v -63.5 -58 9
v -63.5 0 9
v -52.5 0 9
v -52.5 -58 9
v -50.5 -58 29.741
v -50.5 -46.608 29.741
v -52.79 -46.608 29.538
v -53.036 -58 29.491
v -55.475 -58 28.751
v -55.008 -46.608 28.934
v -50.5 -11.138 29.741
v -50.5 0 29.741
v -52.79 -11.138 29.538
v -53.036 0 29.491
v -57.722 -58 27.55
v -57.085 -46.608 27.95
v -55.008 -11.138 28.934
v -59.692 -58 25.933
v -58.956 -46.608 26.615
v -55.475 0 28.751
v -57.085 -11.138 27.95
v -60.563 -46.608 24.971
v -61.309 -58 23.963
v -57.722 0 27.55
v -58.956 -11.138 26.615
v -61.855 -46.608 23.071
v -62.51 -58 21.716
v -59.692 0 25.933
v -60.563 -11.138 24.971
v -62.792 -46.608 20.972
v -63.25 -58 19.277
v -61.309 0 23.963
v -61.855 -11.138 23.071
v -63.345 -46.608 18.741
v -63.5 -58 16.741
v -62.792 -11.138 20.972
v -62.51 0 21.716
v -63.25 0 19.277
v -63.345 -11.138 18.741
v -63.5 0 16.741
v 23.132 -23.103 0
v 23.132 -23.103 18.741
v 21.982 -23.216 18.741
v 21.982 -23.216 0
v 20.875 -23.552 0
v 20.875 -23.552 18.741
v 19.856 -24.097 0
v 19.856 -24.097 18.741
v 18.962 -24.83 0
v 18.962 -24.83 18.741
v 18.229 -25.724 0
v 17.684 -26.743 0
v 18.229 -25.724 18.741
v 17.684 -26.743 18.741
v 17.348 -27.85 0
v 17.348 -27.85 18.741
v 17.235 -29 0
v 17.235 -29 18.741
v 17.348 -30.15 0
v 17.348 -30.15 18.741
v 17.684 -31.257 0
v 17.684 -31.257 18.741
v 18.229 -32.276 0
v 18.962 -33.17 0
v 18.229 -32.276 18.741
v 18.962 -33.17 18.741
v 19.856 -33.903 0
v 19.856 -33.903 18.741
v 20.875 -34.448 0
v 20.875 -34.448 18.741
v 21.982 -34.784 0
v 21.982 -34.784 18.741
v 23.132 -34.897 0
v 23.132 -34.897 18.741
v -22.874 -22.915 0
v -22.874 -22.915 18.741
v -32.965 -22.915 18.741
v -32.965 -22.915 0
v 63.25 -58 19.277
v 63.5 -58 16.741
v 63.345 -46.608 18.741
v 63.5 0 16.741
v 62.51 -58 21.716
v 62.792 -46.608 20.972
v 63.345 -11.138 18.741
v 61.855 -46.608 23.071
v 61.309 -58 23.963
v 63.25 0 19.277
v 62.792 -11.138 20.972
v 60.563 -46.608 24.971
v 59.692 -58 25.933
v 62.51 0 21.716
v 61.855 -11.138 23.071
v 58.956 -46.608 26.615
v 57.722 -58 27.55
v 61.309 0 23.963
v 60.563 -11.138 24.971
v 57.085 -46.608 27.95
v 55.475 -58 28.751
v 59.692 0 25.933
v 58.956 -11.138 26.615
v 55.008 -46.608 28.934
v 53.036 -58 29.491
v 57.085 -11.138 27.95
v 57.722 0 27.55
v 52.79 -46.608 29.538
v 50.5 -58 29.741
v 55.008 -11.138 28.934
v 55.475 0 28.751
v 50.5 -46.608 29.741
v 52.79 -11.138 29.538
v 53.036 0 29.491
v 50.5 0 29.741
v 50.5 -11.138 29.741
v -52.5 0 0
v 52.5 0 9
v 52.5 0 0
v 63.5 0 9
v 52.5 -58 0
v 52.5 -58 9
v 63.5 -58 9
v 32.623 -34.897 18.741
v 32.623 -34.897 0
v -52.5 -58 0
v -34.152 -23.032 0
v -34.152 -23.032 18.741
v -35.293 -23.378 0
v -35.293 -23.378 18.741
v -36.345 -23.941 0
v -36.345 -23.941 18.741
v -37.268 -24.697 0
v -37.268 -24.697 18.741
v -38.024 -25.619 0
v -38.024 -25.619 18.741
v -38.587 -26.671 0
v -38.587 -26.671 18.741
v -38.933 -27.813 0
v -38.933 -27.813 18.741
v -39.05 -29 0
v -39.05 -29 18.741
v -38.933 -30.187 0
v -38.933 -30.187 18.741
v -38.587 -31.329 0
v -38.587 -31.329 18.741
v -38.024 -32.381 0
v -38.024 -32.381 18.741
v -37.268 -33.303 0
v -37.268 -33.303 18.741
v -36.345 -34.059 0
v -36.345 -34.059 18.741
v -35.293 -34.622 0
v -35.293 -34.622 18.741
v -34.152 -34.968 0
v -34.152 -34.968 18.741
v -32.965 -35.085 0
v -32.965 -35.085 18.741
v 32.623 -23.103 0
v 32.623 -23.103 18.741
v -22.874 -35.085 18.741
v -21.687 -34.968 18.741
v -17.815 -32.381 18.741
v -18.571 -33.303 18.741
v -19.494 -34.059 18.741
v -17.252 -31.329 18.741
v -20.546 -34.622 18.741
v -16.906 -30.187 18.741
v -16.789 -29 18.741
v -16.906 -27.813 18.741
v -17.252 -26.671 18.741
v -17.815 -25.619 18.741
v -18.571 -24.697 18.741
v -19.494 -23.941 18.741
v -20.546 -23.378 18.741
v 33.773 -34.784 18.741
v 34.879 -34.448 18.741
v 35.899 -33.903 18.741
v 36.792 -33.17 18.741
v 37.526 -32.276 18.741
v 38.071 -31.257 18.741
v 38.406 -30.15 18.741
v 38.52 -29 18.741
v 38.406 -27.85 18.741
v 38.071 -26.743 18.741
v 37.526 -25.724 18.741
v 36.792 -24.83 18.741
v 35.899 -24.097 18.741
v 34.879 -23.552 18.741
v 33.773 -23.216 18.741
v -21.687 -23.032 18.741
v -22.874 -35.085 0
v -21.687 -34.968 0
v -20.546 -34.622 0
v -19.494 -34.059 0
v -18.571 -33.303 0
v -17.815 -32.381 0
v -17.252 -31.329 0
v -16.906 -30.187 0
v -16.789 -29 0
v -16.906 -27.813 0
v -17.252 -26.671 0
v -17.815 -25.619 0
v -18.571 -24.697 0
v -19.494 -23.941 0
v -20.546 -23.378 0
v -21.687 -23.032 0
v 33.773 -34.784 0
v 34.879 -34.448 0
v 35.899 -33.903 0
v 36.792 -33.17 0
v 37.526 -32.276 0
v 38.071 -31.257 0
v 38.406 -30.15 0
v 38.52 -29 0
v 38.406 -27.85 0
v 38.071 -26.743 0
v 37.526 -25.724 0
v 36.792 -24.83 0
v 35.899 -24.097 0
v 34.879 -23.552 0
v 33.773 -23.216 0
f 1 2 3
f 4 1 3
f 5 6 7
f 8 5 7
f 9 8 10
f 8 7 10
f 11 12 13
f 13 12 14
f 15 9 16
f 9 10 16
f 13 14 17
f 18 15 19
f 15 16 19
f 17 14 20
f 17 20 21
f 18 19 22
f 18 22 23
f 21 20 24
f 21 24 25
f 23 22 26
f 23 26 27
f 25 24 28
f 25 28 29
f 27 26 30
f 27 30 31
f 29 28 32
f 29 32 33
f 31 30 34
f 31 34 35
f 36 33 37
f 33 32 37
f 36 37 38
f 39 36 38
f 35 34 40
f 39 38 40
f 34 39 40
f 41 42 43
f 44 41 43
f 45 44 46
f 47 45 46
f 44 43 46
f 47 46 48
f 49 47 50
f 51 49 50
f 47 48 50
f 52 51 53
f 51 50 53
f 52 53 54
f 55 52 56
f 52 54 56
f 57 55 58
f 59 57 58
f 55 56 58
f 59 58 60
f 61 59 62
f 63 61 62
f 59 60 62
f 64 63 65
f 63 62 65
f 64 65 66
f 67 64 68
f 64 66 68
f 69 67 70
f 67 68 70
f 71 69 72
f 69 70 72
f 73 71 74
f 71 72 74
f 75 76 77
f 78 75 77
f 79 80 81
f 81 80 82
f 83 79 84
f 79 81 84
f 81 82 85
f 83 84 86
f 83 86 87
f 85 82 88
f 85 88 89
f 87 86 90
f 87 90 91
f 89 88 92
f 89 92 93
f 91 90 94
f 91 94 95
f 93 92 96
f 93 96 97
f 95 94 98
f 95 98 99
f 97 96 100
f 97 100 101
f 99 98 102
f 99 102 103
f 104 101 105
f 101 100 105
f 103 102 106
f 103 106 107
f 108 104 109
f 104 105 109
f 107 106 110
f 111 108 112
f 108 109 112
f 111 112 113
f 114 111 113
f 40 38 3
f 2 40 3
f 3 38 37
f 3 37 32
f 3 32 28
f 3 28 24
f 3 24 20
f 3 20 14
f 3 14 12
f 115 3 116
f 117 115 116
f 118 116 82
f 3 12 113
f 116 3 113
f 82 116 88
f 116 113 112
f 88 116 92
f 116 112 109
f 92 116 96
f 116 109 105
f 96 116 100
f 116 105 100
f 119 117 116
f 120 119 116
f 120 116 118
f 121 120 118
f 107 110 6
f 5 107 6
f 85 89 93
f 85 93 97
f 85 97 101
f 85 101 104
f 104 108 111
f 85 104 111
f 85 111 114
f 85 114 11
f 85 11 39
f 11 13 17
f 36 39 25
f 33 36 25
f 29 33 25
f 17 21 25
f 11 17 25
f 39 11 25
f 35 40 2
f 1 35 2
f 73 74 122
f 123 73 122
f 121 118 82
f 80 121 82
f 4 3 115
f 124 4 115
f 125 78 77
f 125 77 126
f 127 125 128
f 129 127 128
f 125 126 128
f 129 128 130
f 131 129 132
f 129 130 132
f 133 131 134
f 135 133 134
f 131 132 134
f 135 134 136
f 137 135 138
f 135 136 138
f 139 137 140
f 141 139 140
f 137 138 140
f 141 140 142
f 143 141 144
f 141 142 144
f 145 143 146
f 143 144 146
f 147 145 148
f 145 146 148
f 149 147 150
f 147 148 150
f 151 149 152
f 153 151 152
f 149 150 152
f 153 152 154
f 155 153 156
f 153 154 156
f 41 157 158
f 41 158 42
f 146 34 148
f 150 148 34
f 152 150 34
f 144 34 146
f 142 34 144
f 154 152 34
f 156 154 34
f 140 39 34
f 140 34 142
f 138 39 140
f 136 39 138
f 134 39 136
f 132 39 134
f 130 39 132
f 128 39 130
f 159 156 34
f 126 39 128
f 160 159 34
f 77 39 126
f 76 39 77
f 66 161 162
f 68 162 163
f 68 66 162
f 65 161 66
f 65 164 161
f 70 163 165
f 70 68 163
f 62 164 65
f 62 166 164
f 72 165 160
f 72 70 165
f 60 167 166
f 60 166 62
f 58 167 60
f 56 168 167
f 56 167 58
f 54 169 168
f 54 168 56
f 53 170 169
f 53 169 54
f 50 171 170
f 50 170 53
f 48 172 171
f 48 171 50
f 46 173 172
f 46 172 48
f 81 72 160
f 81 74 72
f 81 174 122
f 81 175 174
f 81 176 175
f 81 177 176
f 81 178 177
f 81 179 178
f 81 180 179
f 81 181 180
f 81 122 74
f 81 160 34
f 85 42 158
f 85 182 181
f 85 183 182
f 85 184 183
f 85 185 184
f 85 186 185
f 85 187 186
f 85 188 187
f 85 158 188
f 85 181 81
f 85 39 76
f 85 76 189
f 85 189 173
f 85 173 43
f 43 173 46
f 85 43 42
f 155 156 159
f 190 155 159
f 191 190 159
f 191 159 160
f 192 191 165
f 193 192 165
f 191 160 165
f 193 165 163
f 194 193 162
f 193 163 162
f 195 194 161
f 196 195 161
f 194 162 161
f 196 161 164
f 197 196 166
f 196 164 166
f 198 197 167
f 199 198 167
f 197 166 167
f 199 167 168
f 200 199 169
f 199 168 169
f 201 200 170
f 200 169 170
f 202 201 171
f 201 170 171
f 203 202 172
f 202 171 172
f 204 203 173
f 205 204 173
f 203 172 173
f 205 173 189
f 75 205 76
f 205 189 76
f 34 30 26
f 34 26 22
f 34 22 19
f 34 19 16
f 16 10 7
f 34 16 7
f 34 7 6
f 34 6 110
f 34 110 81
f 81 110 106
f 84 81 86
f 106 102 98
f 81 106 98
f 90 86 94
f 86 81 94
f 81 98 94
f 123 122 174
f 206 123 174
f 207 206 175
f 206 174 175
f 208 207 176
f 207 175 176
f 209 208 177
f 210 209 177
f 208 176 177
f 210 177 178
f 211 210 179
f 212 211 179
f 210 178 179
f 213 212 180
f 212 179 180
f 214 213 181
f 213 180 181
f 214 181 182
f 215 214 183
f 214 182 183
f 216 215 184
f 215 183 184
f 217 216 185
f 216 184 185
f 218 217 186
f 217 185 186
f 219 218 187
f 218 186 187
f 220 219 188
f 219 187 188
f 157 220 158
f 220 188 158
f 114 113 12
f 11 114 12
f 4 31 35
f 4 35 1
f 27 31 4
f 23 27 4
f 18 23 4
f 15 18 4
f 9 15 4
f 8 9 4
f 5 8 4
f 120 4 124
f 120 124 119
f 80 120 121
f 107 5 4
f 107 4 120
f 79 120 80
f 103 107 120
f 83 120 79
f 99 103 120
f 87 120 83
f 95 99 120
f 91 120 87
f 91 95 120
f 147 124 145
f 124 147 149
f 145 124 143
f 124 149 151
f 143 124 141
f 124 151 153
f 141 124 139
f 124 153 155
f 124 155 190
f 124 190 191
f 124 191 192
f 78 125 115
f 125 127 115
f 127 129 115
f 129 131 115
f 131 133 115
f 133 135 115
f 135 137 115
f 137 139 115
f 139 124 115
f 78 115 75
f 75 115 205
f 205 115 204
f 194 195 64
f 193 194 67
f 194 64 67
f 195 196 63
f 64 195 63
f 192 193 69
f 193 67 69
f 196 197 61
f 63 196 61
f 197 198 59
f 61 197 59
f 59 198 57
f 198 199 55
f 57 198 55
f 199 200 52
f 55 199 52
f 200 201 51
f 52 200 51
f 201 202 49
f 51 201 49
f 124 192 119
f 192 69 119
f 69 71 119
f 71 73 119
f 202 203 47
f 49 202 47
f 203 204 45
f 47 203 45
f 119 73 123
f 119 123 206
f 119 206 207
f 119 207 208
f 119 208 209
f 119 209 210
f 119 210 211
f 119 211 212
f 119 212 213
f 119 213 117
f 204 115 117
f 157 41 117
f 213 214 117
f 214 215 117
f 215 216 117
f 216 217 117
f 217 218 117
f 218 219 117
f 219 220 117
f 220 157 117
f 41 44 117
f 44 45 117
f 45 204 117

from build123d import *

# Parameters (mm, degrees)
F1_DEPTH = 58
F4_DEPTH = 29.741798
F6_DEPTH = 11


with BuildPart() as f1:
    # F0 (on Front) → F1 (new body)
    with BuildSketch(Plane.XZ):
        with BuildLine():
            Line((-52.5, 9), (-52.5, 0))
            Line((-52.5, 0), (52.5, 0))
            Line((52.5, 0), (52.5, 9))
            Line((52.5, 9), (63.5, 9))
            Line((63.5, 9), (63.5, 16.740798))
            ThreePointArc((63.5, 16.740798), (59.692388, 25.933186), (50.5, 29.740798))
            Line((50.5, 29.740798), (-50.5, 29.740798))
            ThreePointArc((-50.5, 29.740798), (-59.692388, 25.933186), (-63.5, 16.740798))
            Line((-63.5, 16.740798), (-63.5, 9))
            Line((-63.5, 9), (-52.5, 9))
        make_face()
    extrude(amount=F1_DEPTH)

    # F3 (on face) → F4 (cut, through all)
    with BuildSketch(Plane.XY.offset(29.740798)):
        with BuildLine():
            Line((-22.874139, -22.915082), (-32.964889, -22.915082))
            ThreePointArc((-32.964889, -22.915082), (-39.049807, -29), (-32.964889, -35.084918))
            Line((-32.964889, -35.084918), (-22.874139, -35.084918))
            ThreePointArc((-22.874139, -35.084918), (-16.789221, -29), (-22.874139, -22.915082))
        make_face()
        with BuildLine():
            Line((32.622553, -23.102847), (23.132133, -23.102847))
            ThreePointArc((23.132133, -23.102847), (17.234981, -29), (23.132133, -34.897153))
            Line((23.132133, -34.897153), (32.622553, -34.897153))
            ThreePointArc((32.622553, -34.897153), (38.519706, -29), (32.622553, -23.102847))
        make_face()
    extrude(amount=-F4_DEPTH, mode=Mode.SUBTRACT)

    # F5 (on face) → F6 (cut)
    with BuildSketch(Plane.XY.offset(29.740798)):
        Polygon((63.615084, -11.138136), (-63.967951, -11.138136), (-63.786983, -46.608031), (63.615084, -46.608031), align=None)
    extrude(amount=-F6_DEPTH, mode=Mode.SUBTRACT)


solid = f1.part
